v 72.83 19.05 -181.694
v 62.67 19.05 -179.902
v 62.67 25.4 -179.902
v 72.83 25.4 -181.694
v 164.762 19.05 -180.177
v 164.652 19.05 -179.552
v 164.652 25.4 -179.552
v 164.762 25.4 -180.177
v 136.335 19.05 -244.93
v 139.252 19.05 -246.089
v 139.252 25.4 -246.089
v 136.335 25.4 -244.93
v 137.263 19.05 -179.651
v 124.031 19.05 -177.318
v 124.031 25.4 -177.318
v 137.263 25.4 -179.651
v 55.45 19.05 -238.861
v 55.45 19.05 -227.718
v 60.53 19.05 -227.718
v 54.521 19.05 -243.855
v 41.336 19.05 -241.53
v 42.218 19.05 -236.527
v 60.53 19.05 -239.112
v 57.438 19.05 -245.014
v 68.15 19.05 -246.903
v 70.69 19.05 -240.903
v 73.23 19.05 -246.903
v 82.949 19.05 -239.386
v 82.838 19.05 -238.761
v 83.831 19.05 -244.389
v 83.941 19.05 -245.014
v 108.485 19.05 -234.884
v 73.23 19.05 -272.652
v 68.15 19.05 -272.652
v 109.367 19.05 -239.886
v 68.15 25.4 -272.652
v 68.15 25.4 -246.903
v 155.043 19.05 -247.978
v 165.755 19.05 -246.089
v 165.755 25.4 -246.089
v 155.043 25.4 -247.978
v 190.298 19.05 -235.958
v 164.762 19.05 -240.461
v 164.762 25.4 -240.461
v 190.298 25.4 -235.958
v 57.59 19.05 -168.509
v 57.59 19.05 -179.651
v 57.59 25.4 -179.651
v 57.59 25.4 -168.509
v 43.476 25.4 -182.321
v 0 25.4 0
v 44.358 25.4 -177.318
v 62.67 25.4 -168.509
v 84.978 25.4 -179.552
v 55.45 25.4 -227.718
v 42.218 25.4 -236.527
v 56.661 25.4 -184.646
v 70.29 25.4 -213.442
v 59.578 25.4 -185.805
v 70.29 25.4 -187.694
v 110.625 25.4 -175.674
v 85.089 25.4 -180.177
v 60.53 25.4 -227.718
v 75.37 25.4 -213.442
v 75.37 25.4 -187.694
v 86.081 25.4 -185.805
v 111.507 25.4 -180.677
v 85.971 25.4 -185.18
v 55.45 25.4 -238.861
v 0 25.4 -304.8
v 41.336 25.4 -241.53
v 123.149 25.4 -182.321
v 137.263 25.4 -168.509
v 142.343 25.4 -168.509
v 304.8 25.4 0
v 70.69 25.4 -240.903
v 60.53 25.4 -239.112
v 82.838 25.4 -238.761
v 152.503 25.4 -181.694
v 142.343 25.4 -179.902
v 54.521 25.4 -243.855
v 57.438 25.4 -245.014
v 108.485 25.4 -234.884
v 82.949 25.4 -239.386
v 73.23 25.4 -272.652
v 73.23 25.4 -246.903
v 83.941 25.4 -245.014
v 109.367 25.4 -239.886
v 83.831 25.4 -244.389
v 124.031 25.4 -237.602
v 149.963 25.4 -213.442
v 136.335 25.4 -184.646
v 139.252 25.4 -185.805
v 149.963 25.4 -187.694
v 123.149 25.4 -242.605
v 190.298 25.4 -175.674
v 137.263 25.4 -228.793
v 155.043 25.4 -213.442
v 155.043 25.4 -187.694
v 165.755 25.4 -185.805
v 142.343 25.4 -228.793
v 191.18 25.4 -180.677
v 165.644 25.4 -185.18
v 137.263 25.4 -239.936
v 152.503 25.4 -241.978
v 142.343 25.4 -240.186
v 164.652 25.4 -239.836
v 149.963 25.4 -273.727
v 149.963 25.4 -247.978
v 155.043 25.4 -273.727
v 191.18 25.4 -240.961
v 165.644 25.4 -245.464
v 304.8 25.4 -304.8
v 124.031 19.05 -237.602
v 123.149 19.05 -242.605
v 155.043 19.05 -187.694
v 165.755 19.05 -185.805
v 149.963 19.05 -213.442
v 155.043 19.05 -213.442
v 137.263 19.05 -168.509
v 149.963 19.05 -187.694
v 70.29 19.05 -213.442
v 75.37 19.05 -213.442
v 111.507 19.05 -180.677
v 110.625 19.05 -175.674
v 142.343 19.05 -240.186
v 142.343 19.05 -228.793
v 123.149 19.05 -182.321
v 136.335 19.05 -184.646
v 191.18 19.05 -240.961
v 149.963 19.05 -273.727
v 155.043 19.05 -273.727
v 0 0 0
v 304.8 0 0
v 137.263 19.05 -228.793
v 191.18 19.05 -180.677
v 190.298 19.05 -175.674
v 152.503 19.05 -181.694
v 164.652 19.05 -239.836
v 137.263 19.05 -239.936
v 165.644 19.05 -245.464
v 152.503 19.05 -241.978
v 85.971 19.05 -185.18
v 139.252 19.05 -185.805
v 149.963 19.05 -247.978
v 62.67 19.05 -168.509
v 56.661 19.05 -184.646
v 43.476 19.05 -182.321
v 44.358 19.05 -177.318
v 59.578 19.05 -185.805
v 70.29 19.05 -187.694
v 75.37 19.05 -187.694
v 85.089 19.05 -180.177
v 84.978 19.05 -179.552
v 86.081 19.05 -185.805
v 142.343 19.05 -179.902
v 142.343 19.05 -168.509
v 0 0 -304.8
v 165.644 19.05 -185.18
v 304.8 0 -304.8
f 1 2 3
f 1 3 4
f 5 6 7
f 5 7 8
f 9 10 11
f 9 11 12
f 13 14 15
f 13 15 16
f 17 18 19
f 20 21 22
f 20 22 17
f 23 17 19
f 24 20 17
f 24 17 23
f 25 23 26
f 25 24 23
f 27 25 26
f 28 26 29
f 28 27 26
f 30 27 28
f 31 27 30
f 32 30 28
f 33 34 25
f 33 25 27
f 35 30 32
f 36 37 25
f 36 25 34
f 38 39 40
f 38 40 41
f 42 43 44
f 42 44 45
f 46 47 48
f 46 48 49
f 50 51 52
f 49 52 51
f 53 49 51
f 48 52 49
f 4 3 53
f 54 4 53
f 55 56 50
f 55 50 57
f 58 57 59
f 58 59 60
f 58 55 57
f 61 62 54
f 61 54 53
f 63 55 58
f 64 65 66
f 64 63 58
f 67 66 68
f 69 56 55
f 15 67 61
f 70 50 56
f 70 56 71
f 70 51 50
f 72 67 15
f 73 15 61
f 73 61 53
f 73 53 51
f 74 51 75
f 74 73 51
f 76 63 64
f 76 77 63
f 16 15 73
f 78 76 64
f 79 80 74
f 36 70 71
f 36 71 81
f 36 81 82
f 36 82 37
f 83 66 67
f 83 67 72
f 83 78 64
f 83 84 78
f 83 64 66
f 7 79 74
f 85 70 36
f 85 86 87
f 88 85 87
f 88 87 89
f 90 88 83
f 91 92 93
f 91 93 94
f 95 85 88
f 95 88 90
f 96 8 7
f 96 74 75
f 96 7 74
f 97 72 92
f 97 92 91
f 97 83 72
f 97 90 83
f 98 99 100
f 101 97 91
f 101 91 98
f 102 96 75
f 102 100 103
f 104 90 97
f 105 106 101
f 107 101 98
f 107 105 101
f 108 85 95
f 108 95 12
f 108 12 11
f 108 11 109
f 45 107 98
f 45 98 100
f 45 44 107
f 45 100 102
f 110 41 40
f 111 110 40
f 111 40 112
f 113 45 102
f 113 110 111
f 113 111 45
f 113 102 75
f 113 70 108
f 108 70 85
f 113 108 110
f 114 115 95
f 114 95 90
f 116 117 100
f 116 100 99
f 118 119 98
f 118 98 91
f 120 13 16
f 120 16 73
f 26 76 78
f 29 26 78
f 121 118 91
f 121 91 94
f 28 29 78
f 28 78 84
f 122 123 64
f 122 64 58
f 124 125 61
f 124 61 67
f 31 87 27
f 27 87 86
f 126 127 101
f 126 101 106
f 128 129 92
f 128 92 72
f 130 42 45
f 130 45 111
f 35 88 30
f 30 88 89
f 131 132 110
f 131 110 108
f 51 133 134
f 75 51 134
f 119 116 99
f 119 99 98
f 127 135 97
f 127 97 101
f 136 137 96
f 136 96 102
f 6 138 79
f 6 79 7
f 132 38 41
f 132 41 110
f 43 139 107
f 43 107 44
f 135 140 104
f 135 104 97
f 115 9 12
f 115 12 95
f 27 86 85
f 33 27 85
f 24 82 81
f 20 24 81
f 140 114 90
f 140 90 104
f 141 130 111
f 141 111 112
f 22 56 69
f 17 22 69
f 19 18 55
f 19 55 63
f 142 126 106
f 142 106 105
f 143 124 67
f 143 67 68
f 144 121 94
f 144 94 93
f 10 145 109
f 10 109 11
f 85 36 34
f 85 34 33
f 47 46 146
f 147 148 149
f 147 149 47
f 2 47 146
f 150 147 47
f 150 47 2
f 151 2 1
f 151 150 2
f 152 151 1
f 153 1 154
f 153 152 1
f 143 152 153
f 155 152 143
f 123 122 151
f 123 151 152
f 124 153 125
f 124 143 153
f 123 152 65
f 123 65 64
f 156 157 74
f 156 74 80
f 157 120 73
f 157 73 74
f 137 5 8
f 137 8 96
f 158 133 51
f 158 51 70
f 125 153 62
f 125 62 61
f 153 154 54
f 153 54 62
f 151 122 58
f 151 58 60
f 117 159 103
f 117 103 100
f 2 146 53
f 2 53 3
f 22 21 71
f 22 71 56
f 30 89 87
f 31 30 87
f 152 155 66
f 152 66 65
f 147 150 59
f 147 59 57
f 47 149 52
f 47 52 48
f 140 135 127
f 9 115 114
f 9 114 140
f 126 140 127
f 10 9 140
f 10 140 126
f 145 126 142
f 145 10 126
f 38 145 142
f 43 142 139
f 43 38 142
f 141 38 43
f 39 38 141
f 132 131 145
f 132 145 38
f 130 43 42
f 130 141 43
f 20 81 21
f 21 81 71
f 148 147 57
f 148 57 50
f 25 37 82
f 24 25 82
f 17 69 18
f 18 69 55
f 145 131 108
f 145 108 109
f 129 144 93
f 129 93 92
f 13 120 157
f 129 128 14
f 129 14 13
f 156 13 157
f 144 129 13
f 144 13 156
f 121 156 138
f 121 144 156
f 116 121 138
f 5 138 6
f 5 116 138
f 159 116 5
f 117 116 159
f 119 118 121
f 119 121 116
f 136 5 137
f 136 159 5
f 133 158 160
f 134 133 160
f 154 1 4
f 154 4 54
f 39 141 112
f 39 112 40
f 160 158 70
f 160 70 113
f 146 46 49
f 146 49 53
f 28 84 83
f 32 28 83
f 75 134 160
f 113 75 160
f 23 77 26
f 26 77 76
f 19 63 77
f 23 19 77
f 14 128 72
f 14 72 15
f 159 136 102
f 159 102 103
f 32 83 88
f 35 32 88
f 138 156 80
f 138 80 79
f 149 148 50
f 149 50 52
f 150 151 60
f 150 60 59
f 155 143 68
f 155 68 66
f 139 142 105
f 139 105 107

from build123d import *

# Parameters (mm, degrees)
SKETCH2_W               = 304.8
SKETCH2_H               = 304.8
BOSS_EXTRUDE1_DEPTH     = 25.4
CUT_EXTRUDE_THIN1_DEPTH = 6.35
SKETCH4_W               = 5.08
SKETCH4_H               = 28.524718884
CUT_EXTRUDE_THIN3_DEPTH = 6.35
CUT_EXTRUDE1_START      = -6.35
CUT_EXTRUDE1_DEPTH      = 6.35
SKETCH_PATTERN1_START   = 19.05
SKETCH_PATTERN1_DEPTH   = 6.35


# Read off the part's stored shape, not the designer's step: Sketch-Pattern1
with BuildPart() as part:
    # Sketch2 → Boss-Extrude1 (new body)
    with BuildSketch(Plane(origin=(0, 0, 0), x_dir=(1, 0, 0), z_dir=(0, 1, 0))):
        with Locations((152.4, 152.4)):
            Rectangle(SKETCH2_W, SKETCH2_H)
    extrude(amount=BOSS_EXTRUDE1_DEPTH)

    # Sketch3 → Cut-Extrude-Thin1 (cut)
    with BuildSketch(Plane(origin=(0, 25.4, 0), x_dir=(1, 0, 0), z_dir=(0, 1, 0))):
        Polygon((58.541128736, 238.760939297), (70.689795772, 240.903077075), (82.838462808, 238.760939297), (83.941128736, 245.014468529), (70.689795772, 247.351036061), (57.438462808, 245.014468529), align=None)
    extrude(amount=-CUT_EXTRUDE_THIN1_DEPTH, mode=Mode.SUBTRACT)

    # Sketch4 → Cut-Extrude-Thin3 (cut)
    with BuildSketch(Plane(origin=(0, 25.4, 0), x_dir=(1, 0, 0), z_dir=(0, 1, 0))):
        Polygon((42.217765698, 236.527485876), (55.449795772, 238.860649788), (55.449795772, 227.718390038), (60.529795772, 227.718390038), (60.529795772, 244.914758038), (41.335632956, 241.530309262), align=None)
        with Locations((70.689795772, 258.38941601)):
            Rectangle(SKETCH4_W, SKETCH4_H)
        Polygon((82.948729401, 239.38629222), (108.484764207, 234.883600304), (109.36689695, 239.886423689), (83.830862143, 244.389115606), align=None)
    extrude(amount=-CUT_EXTRUDE_THIN3_DEPTH, mode=Mode.SUBTRACT)

    # Sketch6 → Cut-Extrude1 (cut)
    with BuildSketch(Plane(origin=(0, 25.4, 0), x_dir=(1, 0, 0), z_dir=(0, 1, 0)).offset(CUT_EXTRUDE1_START)):
        Polygon((57.438462808, 245.014468529), (54.521459745, 243.855326287), (57.548729401, 244.389115606), align=None)
    extrude(amount=CUT_EXTRUDE1_DEPTH, mode=Mode.SUBTRACT)

    # Sketch-Pattern1 outline → Sketch-Pattern1 (cut)
    with BuildSketch(Plane(origin=(0, 0, 0), x_dir=(1, 0, 0), z_dir=(0, 1, 0)).offset(SKETCH_PATTERN1_START)):
        Polygon((165.644408099, 185.179807617), (165.754674692, 185.80516054), (155.043341728, 187.693857541), (155.043341728, 213.442467463), (149.963341728, 213.442467463), (149.963341728, 187.693857541), (139.252008764, 185.80516054), (136.335005701, 184.646018299), (123.149178912, 182.321001273), (124.031311655, 177.318177888), (137.263341728, 179.651341799), (137.263341728, 168.509082049), (142.343341728, 168.509082049), (142.343341728, 179.902286963), (152.503341728, 181.693769087), (164.652008764, 179.551631308), (164.762275357, 180.176984232), (190.298310163, 175.674292315), (191.180442906, 180.6771157), align=None)
        Polygon((165.644408099, 245.46400238), (165.754674692, 246.089355303), (155.043341728, 247.978052304), (155.043341728, 273.726662226), (149.963341728, 273.726662226), (149.963341728, 247.978052304), (139.252008764, 246.089355303), (136.335005701, 244.930213062), (123.149178912, 242.605196036), (124.031311655, 237.60237265), (137.263341728, 239.935536562), (137.263341728, 228.793276812), (142.343341728, 228.793276812), (142.343341728, 240.186481725), (152.503341728, 241.977963849), (164.652008764, 239.835826071), (164.762275357, 240.461178994), (190.298310163, 235.958487078), (191.180442906, 240.961310463), align=None)
        Polygon((85.970773635, 185.179807617), (86.081040228, 185.80516054), (75.369707264, 187.693857541), (75.369707264, 213.442467463), (70.289707264, 213.442467463), (70.289707264, 187.693857541), (59.578374299, 185.80516054), (56.661371236, 184.646018299), (43.475544447, 182.321001273), (44.35767719, 177.318177888), (57.589707264, 179.651341799), (57.589707264, 168.509082049), (62.669707264, 168.509082049), (62.669707264, 179.902286963), (72.829707264, 181.693769087), (84.978374299, 179.551631308), (85.088640892, 180.176984232), (110.624675699, 175.674292315), (111.506808441, 180.6771157), align=None)
    extrude(amount=SKETCH_PATTERN1_DEPTH, mode=Mode.SUBTRACT)


solid = part.part
